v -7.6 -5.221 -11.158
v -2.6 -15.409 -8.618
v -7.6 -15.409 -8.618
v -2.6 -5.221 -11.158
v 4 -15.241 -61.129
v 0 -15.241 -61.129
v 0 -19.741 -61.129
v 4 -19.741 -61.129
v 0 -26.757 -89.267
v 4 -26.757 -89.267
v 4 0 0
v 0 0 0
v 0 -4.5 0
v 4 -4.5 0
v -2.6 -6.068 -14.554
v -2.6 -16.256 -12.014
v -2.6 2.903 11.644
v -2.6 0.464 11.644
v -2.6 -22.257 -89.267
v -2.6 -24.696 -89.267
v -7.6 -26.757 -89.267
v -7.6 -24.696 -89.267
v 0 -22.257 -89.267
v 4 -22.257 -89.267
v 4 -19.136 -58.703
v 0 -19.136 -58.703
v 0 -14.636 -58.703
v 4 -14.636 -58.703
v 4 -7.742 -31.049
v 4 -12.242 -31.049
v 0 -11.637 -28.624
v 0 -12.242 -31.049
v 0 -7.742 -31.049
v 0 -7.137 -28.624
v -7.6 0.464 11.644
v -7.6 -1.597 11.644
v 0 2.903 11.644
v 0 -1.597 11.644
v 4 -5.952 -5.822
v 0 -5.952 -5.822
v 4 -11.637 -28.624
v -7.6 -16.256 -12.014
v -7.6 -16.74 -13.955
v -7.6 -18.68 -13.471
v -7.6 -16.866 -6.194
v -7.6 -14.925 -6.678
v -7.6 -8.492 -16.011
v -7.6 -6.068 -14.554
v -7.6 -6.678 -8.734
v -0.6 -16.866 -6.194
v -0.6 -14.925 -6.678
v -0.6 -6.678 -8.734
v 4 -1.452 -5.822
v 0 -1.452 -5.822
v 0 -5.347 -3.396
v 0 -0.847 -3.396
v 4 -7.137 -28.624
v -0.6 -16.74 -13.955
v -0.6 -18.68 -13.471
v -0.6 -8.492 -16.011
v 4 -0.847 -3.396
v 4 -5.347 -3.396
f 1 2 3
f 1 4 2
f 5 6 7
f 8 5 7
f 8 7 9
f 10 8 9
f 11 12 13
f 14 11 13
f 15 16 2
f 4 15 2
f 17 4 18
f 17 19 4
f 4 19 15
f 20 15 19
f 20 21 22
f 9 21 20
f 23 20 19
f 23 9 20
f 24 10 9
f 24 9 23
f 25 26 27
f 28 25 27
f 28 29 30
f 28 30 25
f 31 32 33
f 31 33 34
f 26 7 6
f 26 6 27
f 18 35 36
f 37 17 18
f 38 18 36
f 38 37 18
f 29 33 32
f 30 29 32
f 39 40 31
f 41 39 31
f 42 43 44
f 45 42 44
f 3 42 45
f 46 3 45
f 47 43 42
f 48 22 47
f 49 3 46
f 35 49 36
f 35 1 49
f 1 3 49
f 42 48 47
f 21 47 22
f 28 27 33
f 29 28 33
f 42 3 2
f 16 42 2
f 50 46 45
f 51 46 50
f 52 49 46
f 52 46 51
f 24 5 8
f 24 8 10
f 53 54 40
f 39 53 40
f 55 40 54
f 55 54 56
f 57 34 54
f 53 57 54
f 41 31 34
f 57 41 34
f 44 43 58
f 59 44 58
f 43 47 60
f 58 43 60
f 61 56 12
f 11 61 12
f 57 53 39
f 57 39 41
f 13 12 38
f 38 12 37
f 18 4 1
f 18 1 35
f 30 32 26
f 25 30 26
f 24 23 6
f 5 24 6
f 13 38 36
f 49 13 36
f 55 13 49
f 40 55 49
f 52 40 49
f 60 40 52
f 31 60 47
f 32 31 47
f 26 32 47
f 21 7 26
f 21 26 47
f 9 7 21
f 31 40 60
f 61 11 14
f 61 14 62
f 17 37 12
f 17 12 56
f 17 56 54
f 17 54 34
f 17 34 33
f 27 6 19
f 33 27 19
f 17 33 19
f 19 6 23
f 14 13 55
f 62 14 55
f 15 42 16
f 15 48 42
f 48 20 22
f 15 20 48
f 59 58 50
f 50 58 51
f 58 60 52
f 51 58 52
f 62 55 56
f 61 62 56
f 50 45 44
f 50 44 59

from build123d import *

# Parameters (mm, degrees)
SIDE_COMB_DEPTH           = 4
SIDE_COMB_2_DEPTH         = 4
SIDE_COMB_3_DEPTH         = 4
SIDE_COMB_4_DEPTH         = 4
SIDE_SPACER_DEPTH         = 2.6
NARROW_SUPPORT_DEPTH      = 5
SKETCH7_W                 = 5
SKETCH7_H                 = 3.5
GAP_FOR_SUPPORT_BAR_DEPTH = 2
SUPPORT_BAR_SIDES_DEPTH   = 8.5
SKETCH8_W                 = 7
SKETCH8_H                 = 7.5
SUPPORT_BAR_BOTTOM_DEPTH  = 2


with BuildPart() as part:
    # Sketch1 → Side comb (new body)
    with BuildSketch(Plane(origin=(0, 0, 0), x_dir=(0, 0, -1), z_dir=(1, 0, 0))):
        Polygon((3.396035042, -0.846726635), (0, 0), (0, -4.5), (3.396035042, -5.346726635), align=None)
    extrude(amount=SIDE_COMB_DEPTH)



with BuildPart() as body_2:
    # Sketch1 → Side comb 2 (new body)
    with BuildSketch(Plane(origin=(0, 0, 0), x_dir=(0, 0, -1), z_dir=(1, 0, 0))):
        Polygon((28.623723925, -7.13669592), (5.821774358, -1.451531374), (5.821774358, -5.951531374), (28.623723925, -11.63669592), align=None)
    extrude(amount=SIDE_COMB_2_DEPTH)


with BuildPart() as body_3:
    # Sketch1 → Side comb 3 (new body)
    with BuildSketch(Plane(origin=(0, 0, 0), x_dir=(0, 0, -1), z_dir=(1, 0, 0))):
        Polygon((58.70289144, -14.636274684), (31.049463241, -7.741500659), (31.049463241, -12.241500659), (58.70289144, -19.136274684), align=None)
    extrude(amount=SIDE_COMB_3_DEPTH)


with BuildPart() as body_4:
    # Sketch1 → Side comb 4 (new body)
    with BuildSketch(Plane(origin=(0, 0, 0), x_dir=(0, 0, -1), z_dir=(1, 0, 0))):
        Polygon((89.267206817, -22.256814395), (61.128630755, -15.241079423), (61.128630755, -19.741079423), (89.267206817, -26.756814395), align=None)
    extrude(amount=SIDE_COMB_4_DEPTH)


with BuildPart() as part_1:
    add(part.part)

    add(body_2.part)  # Side spacer merges body 2

    add(body_3.part)  # Side spacer merges body 3

    add(body_4.part)  # Side spacer merges body 4
    # Sketch2 → Side spacer (add)
    with BuildSketch(Plane.ZY):
        Polygon((-89.267206817, -22.256814395), (-89.267206817, -26.756814395), (11.643548715, -1.596937253), (11.643548715, 2.903062747), align=None)
    extrude(amount=SIDE_SPACER_DEPTH)

    # Sketch3 → Narrow support (add)
    with BuildSketch(Plane.ZY.offset(2.6)):
        Polygon((-89.267206817, -24.695587136), (11.643548715, 0.464290006), (11.643548715, -1.596937253), (-89.267206817, -26.756814395), align=None)
    extrude(amount=NARROW_SUPPORT_DEPTH)

    # Sketch7 → Gap for support bar (cut)
    with BuildSketch(Plane(origin=(0, -4.236632084, 1.056311016), x_dir=(1, 0, 0), z_dir=(0, -0.970295726, 0.241921896))):
        with Locations((-5.1, -13.839992525)):
            Rectangle(SKETCH7_W, SKETCH7_H)
    extrude(amount=-GAP_FOR_SUPPORT_BAR_DEPTH, mode=Mode.SUBTRACT)

    # Sketch6 → Support bar sides (add)
    with BuildSketch(Plane(origin=(0, -4.236632084, 1.056311016), x_dir=(1, 0, 0), z_dir=(0, -0.970295726, 0.241921896))):
        Polygon((-2.6, -12.089992525), (-7.6, -12.089992525), (-7.6, -10.089992525), (-0.6, -10.089992525), (-0.6, -17.589992525), (-7.6, -17.589992525), (-7.6, -15.589992525), (-2.6, -15.589992525), align=None)
    extrude(amount=SUPPORT_BAR_SIDES_DEPTH)

    # Sketch8 → Support bar bottom (add)
    with BuildSketch(Plane(origin=(0, -12.484145757, 3.112647129), x_dir=(1, 0, 0), z_dir=(0, -0.970295726, 0.241921896))):
        with Locations((-4.1, -13.839992525)):
            Rectangle(SKETCH8_W, SKETCH8_H)
    extrude(amount=SUPPORT_BAR_BOTTOM_DEPTH)


solid = part_1.part
